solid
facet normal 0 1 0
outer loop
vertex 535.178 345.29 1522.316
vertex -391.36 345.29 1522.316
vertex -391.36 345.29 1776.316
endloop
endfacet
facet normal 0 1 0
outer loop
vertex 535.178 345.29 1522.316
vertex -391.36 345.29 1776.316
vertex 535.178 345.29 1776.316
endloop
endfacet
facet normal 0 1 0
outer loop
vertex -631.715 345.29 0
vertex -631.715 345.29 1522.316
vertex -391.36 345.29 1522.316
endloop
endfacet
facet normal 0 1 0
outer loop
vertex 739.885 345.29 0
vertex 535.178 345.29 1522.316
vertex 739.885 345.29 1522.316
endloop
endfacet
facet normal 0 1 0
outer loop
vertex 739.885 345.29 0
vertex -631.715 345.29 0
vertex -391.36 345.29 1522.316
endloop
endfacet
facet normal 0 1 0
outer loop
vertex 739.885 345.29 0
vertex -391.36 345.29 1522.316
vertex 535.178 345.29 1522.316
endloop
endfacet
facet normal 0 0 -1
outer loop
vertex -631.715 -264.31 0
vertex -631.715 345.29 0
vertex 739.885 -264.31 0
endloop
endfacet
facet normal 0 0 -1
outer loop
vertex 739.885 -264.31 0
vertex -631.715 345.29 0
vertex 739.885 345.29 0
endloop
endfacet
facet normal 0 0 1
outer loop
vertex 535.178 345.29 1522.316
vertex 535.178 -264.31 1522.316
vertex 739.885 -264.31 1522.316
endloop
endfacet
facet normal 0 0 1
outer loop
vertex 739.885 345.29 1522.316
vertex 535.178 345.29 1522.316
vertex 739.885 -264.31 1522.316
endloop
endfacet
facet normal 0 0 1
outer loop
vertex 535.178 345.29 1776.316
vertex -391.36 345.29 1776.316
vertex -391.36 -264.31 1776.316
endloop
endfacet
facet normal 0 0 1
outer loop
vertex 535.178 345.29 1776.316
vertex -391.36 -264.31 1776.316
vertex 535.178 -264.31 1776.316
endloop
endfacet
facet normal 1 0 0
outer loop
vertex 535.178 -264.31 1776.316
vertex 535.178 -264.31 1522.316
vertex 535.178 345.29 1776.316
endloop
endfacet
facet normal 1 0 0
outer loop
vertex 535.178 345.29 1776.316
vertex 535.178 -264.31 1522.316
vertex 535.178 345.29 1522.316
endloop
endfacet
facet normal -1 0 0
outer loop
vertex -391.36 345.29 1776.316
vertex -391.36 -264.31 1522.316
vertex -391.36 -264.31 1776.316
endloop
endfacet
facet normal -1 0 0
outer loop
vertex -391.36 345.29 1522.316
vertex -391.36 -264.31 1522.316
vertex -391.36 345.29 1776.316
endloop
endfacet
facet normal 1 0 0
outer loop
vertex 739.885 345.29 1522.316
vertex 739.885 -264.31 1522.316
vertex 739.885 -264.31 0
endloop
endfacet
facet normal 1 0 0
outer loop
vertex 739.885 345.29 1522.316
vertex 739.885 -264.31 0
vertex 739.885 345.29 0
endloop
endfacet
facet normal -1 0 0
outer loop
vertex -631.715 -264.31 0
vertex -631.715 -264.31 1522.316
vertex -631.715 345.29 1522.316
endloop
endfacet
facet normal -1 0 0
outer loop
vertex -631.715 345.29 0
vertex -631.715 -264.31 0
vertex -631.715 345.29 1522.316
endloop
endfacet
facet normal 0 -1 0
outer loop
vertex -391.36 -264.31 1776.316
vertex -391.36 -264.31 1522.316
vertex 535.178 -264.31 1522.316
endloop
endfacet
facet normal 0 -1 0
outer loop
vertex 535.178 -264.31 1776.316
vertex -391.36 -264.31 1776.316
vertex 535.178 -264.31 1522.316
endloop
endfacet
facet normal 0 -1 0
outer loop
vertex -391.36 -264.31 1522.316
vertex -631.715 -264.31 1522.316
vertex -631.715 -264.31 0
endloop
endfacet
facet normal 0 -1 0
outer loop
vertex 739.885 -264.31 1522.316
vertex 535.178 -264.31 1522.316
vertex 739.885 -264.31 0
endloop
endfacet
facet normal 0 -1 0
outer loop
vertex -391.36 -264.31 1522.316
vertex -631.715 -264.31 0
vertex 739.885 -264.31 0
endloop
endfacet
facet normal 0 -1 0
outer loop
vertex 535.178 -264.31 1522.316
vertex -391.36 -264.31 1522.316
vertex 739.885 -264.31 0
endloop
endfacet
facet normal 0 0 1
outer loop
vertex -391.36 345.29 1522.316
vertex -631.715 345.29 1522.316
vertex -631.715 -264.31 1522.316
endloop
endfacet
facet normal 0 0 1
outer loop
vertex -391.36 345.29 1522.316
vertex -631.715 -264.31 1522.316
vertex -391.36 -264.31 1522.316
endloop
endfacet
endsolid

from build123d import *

# Parameters (mm, degrees)
F0_W       = 1371.6
F0_H       = 609.6
F1_DEPTH   = 254
F2_W       = 926.5377521515
F2_H       = 609.6
F1_FACE1_W = 1371.6
F1_FACE1_H = 609.6
F3_DEPTH   = 1522.3157249


# Not quite as in the source:
# - an extrude ends at something that could not be found from the text; its depth is read off the source's solid


with BuildPart() as f1:
    # F0 (on Top) → F1 (new body)
    with BuildSketch(Plane.XY):
        with Locations((54.0854626386, 40.4904214665)):
            Rectangle(F0_W, F0_H)
    extrude(amount=F1_DEPTH)

    # F2 (on face) + F1_face1 (on face) → F3 (join, through all)
    with BuildSketch(Plane.XY.offset(254)):
        with Locations((71.9089508057, 40.4904214665)):
            Rectangle(F2_W, F2_H)
    with BuildSketch(Plane(origin=(54.0854626386, 40.4904214665, 0), x_dir=(1, 0, 0), z_dir=(0, 0, -1))):
        Rectangle(F1_FACE1_W, F1_FACE1_H)
    extrude(amount=F3_DEPTH, dir=(0, 0, 1))


solid = f1.part
